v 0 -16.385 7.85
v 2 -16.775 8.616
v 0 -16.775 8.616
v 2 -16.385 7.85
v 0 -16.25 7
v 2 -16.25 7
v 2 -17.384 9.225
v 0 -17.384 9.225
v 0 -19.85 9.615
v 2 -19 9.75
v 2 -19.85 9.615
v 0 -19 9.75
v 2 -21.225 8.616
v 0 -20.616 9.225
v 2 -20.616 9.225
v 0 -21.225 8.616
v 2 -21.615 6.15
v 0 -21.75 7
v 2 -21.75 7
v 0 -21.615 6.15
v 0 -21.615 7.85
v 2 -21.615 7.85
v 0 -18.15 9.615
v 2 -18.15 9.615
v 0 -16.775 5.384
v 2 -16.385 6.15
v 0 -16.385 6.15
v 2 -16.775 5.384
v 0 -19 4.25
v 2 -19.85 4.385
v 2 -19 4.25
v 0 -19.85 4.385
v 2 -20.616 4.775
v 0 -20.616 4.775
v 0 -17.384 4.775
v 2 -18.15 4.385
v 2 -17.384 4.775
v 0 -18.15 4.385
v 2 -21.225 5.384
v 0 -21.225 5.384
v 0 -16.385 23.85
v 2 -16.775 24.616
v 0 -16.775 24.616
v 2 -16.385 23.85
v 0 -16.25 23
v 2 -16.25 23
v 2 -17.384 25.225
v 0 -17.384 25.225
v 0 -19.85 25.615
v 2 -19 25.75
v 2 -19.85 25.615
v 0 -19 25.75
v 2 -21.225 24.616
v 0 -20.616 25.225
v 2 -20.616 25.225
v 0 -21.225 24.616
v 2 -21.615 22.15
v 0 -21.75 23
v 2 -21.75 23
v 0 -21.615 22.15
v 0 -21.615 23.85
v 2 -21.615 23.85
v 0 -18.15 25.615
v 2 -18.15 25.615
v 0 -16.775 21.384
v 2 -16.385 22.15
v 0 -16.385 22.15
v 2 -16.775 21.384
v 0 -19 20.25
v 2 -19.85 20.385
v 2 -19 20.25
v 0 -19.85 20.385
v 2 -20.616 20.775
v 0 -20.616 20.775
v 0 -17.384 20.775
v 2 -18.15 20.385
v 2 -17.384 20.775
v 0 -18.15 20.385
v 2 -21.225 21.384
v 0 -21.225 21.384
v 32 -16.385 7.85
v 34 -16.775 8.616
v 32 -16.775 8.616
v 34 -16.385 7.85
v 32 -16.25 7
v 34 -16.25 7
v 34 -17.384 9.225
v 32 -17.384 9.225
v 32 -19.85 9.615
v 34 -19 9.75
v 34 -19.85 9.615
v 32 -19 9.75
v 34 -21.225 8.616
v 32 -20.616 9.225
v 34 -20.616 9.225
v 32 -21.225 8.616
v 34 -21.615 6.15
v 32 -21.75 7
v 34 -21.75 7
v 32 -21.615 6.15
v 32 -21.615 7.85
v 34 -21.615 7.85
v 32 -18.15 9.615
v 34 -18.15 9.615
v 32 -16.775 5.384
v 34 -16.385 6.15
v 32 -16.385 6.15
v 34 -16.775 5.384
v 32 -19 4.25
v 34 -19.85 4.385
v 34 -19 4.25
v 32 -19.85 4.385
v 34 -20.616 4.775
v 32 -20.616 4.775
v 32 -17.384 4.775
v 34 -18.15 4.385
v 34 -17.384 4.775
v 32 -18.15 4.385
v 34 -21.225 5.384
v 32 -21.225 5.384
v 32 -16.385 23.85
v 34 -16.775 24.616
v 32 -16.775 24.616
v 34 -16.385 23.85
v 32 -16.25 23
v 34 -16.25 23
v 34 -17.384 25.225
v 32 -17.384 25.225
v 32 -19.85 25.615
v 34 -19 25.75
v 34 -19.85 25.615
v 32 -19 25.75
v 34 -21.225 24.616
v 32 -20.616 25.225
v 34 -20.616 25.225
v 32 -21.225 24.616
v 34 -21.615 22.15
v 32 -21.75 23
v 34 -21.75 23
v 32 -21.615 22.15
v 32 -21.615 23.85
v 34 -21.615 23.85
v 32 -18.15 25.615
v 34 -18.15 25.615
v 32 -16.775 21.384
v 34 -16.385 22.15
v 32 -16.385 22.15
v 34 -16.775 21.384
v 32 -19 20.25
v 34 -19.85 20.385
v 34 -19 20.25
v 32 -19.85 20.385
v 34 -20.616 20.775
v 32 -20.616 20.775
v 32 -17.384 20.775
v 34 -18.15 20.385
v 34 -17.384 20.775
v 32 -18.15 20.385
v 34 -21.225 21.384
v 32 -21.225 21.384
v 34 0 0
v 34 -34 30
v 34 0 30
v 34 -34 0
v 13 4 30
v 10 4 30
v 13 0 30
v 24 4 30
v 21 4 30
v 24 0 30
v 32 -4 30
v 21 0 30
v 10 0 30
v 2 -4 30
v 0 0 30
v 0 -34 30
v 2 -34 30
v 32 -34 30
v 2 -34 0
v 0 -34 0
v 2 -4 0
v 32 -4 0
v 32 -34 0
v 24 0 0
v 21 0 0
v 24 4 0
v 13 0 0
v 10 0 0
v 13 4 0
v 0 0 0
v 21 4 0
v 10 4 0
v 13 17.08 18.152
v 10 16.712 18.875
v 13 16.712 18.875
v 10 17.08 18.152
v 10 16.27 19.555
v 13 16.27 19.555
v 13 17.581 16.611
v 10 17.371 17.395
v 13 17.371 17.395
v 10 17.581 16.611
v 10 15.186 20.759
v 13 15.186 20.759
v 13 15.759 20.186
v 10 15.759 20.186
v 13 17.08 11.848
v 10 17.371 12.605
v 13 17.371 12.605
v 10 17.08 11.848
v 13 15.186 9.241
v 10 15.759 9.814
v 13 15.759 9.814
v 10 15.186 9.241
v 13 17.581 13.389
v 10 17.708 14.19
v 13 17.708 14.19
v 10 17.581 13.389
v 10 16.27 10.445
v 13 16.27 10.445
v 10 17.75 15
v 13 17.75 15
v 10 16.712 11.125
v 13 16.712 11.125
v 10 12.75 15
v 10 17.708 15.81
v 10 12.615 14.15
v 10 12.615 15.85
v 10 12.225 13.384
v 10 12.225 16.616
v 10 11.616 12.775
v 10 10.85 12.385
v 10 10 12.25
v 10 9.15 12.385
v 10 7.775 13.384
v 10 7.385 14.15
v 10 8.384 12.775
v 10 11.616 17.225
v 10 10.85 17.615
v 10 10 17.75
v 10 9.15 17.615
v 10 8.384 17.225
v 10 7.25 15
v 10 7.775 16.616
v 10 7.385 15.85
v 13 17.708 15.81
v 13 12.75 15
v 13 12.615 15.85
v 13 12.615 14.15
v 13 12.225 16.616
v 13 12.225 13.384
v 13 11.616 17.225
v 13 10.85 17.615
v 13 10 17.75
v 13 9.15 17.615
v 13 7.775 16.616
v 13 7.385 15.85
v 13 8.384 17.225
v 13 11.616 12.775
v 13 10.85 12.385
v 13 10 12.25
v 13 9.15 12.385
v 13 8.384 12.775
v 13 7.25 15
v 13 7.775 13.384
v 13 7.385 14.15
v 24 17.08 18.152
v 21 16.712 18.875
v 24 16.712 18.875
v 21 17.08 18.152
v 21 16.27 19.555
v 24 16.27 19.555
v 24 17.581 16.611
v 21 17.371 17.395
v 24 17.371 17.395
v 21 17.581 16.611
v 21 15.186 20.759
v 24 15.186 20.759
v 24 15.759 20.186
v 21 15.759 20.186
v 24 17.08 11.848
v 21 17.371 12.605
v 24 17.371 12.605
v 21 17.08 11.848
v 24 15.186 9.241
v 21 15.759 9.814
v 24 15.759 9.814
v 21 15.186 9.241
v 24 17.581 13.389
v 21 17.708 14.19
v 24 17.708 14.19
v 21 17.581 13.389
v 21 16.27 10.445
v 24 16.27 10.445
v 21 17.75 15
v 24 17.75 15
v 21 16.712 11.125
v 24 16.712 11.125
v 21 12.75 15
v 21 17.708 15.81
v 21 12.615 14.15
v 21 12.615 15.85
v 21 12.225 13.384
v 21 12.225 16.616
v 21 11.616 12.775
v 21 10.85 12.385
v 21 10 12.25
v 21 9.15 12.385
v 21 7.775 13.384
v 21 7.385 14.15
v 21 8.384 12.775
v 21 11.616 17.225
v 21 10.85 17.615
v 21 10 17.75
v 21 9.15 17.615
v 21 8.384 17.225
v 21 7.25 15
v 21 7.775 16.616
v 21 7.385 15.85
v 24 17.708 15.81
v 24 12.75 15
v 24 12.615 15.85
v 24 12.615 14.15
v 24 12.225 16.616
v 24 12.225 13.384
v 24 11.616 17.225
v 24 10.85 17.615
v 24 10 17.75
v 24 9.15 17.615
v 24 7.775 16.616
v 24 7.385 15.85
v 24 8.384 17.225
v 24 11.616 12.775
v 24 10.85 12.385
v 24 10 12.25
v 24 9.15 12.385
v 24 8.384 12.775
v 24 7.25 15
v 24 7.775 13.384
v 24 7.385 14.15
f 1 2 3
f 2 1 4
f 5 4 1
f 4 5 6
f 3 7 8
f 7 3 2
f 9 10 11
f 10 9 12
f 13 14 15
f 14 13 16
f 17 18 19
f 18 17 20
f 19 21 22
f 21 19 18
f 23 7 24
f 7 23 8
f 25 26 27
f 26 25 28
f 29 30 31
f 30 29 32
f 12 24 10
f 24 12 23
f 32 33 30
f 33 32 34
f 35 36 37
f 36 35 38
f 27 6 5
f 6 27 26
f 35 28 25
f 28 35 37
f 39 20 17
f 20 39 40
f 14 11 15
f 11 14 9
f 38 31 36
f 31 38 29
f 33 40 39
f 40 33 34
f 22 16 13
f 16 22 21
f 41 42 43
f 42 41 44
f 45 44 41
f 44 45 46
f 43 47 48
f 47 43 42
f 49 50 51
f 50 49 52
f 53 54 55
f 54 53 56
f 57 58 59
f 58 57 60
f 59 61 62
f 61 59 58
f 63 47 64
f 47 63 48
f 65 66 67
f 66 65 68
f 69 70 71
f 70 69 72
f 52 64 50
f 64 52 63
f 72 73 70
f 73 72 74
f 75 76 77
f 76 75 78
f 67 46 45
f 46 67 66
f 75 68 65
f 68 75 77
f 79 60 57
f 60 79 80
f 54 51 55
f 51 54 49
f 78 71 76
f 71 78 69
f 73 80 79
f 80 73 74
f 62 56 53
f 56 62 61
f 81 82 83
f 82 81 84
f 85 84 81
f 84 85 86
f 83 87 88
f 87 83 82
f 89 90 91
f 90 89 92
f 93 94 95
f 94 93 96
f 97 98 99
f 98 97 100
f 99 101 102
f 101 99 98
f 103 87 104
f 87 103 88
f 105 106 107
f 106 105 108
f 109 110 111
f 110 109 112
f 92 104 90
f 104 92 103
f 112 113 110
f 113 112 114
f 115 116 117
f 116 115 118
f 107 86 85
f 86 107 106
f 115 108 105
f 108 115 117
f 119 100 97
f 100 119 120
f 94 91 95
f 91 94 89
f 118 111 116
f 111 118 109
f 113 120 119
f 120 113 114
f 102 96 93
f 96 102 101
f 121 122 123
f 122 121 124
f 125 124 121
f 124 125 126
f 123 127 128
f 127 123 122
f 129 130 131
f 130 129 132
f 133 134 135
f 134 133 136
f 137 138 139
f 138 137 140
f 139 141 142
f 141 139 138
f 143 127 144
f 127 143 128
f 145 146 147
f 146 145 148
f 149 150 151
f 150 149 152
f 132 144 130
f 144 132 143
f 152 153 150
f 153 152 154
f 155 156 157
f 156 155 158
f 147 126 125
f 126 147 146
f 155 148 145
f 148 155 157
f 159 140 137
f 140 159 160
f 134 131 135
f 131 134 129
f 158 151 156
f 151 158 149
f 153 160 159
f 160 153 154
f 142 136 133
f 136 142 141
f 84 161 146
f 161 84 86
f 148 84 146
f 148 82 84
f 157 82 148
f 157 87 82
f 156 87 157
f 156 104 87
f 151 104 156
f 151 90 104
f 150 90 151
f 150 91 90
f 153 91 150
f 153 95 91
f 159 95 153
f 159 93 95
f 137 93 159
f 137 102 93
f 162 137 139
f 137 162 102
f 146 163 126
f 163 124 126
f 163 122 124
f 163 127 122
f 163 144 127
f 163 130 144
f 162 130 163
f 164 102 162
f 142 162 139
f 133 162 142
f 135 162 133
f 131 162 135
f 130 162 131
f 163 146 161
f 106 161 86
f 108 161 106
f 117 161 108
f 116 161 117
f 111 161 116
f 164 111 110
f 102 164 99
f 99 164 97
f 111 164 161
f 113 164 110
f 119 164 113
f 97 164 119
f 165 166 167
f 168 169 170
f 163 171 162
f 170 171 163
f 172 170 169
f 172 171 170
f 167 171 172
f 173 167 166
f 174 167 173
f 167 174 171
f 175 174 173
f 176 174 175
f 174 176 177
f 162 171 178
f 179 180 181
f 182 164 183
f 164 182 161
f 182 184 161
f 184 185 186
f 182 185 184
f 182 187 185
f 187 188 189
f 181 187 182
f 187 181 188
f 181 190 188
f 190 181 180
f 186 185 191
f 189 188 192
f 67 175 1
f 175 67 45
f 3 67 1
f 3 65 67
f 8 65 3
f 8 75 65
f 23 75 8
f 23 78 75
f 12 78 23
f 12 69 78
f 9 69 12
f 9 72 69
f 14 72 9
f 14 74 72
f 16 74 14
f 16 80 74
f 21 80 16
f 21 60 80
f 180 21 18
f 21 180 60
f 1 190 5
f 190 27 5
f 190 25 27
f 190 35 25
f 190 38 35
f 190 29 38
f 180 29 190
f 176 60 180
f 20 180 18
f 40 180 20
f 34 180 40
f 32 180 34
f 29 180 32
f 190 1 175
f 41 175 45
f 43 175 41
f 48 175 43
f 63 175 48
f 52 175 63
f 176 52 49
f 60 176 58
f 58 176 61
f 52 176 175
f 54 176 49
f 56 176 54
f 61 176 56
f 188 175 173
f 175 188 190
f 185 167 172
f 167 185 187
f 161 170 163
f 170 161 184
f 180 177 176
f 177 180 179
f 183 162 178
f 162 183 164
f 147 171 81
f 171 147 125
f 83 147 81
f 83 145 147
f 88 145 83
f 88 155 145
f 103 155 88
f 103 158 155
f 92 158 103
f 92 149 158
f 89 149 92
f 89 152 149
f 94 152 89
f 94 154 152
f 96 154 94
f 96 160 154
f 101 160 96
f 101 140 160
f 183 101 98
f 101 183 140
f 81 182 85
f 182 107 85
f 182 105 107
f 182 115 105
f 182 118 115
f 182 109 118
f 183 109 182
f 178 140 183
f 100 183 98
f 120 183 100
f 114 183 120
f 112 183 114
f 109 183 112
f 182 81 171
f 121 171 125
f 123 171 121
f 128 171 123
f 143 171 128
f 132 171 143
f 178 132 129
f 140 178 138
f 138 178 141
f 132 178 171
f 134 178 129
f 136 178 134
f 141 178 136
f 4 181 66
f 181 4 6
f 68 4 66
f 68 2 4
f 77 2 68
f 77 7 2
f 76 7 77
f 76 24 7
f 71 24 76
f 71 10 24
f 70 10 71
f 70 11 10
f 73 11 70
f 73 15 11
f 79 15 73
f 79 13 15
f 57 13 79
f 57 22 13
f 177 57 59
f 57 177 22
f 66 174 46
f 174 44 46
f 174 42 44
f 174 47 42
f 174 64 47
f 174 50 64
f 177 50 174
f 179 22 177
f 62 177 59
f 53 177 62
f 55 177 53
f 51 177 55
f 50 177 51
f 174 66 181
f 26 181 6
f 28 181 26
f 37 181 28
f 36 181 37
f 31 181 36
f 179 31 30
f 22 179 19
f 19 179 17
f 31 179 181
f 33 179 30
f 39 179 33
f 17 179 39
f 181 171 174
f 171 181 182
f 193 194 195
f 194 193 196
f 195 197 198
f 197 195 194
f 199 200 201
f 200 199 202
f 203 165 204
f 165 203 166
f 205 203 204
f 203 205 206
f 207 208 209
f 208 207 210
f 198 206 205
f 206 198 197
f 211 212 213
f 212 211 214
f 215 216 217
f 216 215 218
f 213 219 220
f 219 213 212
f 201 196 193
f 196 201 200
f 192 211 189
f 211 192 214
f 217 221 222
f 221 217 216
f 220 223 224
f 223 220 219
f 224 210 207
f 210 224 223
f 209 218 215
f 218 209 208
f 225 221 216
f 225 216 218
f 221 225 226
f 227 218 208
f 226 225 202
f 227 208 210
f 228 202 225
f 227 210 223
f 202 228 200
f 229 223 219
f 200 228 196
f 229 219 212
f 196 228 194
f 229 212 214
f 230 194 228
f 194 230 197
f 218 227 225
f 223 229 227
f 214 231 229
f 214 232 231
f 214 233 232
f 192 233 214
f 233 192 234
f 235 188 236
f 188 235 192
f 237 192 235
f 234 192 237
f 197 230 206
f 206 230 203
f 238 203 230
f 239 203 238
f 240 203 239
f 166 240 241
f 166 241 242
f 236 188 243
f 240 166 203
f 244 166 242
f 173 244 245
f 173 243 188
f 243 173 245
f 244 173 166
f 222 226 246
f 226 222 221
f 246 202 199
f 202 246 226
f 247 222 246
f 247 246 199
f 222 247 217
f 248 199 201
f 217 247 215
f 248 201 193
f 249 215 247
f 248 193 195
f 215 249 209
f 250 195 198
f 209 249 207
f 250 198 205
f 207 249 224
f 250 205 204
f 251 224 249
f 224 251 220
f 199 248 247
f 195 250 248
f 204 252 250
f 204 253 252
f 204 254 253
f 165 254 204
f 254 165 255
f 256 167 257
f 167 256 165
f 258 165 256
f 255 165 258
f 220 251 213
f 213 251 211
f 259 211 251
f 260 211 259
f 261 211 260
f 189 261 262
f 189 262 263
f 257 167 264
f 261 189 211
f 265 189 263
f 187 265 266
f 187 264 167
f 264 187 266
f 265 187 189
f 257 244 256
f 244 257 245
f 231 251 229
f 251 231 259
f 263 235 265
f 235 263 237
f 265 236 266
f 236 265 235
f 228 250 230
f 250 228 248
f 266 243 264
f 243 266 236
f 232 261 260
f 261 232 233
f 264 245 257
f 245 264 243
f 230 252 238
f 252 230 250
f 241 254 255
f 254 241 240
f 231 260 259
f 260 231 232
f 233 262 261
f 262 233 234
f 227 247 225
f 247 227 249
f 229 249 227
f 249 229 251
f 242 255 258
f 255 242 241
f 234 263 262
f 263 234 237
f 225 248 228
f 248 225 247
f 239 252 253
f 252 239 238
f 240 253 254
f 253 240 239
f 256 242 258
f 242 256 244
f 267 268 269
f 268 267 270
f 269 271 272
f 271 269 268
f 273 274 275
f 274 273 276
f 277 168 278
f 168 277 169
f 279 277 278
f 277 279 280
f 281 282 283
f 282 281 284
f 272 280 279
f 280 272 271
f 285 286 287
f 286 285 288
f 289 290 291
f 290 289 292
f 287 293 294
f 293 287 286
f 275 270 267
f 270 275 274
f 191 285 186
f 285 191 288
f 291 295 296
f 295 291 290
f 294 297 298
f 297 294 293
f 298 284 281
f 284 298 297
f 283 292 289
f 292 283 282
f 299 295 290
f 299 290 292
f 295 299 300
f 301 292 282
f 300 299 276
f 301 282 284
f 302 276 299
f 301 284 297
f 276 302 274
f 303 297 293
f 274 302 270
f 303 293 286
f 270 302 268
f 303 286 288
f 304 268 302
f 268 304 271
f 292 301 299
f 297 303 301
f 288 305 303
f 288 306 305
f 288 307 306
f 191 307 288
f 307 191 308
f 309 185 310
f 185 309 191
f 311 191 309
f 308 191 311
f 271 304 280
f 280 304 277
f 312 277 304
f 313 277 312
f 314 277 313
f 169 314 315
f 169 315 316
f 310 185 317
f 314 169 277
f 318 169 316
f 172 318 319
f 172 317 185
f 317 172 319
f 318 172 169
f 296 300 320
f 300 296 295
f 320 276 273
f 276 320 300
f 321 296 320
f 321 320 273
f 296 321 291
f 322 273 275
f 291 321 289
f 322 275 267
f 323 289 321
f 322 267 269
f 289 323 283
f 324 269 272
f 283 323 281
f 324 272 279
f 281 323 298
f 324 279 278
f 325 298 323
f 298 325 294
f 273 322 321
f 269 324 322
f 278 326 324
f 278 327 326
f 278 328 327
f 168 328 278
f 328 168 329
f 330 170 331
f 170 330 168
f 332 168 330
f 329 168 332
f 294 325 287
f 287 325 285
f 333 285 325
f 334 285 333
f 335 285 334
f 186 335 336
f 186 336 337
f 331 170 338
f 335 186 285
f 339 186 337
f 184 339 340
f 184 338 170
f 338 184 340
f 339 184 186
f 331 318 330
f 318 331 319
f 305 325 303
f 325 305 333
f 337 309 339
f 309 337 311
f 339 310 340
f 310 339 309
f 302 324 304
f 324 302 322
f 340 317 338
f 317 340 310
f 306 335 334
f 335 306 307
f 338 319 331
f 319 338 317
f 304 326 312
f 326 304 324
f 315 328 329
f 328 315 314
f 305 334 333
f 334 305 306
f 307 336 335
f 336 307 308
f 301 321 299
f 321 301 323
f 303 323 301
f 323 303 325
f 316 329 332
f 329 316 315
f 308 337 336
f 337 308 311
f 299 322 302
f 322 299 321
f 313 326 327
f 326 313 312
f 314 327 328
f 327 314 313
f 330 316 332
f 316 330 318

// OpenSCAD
// file: ../lib/ALU_profile_holder_side.scad
include <../../parameters.scad>



module ALU_profile_holder_side() {
    wall_thickness = ALU_profile_holder_wall_thickness;
    
    //díry na přišroubování k Al profilům
    module screws_holes(diameter) {
        translate([0, 0, 7])
            rotate([90, 0, 90])
                cylinder(d=diameter, h=wall_thickness*2, center=true, $fn=20);
        
        translate([0, 0, strain_gauge_screw_distance+13])
            rotate([90, 0, 90])
                cylinder(d=diameter, h=wall_thickness*2, center=true, $fn=20);
    }
    
    difference() {
        cube([ALU_profile_width+wall_thickness*2, ALU_profile_width+wall_thickness*2, strain_gauge_screw_distance+20]);

        translate([wall_thickness, 0, 0])
        cube([ALU_profile_width, ALU_profile_width, strain_gauge_screw_distance+20]);
        
        translate([wall_thickness*0.5, ALU_profile_width/2, 0]) {
                screws_holes(M5_screw_diameter);
                translate([ALU_profile_width+wall_thickness, 0, 0]) {
                    screws_holes(M5_screw_diameter);
                }
        }
    }
}

ALU_profile_holder_side();
// file: ../../parameters.scad
//Main tube diameter - hole [mm]
main_tube_outer_diameter = 25.4;
main_tube_inner_diameter = 23.05;

//Tube for undercarriage - rendered hole [mm]
tube_for_undercarriage_outer_diameter = 10.6;
tube_for_undercarriage_inner_diameter = 6;
global_clearance = 0.5;


// Nastavení parametrů rotoru

gliding_aggle = 14;         // tenhle úhel by se zřejmě v budoucnu měl počítat z požadované klouzavosti.


rotor_blade_AOA = 1.5;      // nastavení úhlu náběhu rotorového listu
rotor_blade_length = 970;   // délka rotorového listu
rotor_blade_depth = 50;     // hloubka rotorového listu

// nastavení parametrů motoru

engine_angle = -8;
engine_diameter = 55;
engine_offset = 55;

engine_screws_radius = 15;
engine_holes_radius = (24 + 44)/4;
engine_shatf_hole_diameter = 13;

// Parameters of tube couplings
coupling_wall_thickness = main_tube_outer_diameter/5;  //width of coupling walls
thickness_between_tubes = main_tube_outer_diameter/10;    // minimum distance between tubes in couplings

coupling_wall_thickness_undercarriage = tube_for_undercarriage_outer_diameter/3;
thickness_between_tubes_undercarriage = tube_for_undercarriage_outer_diameter/10;

608_bearing_outer_diameter = 22.3;
608_bearing_thickness = 7.1;


// screw length step - minimum difference in length between two types of screws
basic_screw_length = 5;


//Screw diameter and nut for M10 [mm]
M10_screw_diameter=10.4;
M10_head_height = 10;
M10_head_diameter = 16+0.5;
M10_nut_height = 10.5;
M10_nut_diameter = 25.5;
M10_nut_pocket = 22.3;

//Screw diameter for M8 [mm]
M8_screw_diameter = 8.6;
M8_head_height = 8;
M8_head_diameter = 13.5;
M8_nut_height = 7.5;
M8_nut_diameter = 14.4 + 0.5;
M8_nut_pocket = 13 + 0.5;

//Screw diameter and nut for M6 [mm]
M6_screw_diameter=6.5;
M6_head_diameter = 10+0.5;
M6_head_height = 6;
M6_nut_height = 4.9;
M6_nut_diameter = 11.8;
M6_nut_pocket = 10.4;

//Screw diameter and nut for M5 [mm]
M5_screw_diameter=5.5;
M5_head_height = 5;
M5_head_diameter = 13+0.5;
M5_nut_height = 4.5;
M5_nut_diameter = 9.4;
M5_nut_pocket = 8.4;

//Screw diameter and nut for M4 [mm]
M4_screw_diameter=4.5;
M4_screw_head_height = 4;
M4_nut_height = 3.2;
M4_nut_diameter = 8.4;
M4_nut_pocket = 7.5;

//Screw diameter and nut for M3 [mm]
M3_screw_diameter = 3.2;
M3_nut_height = 2.7;
M3_nut_diameter = 6.6;
M3_screw_head_height = 3;

//Screw diameter and nut for M2,5 [mm]
M2_5_screw_diameter = 2.7;
M2_5_nut_height = 2.3;
M2_5_nut_diameter = 6;
M2_5_nut_pocket = 5.5;


//šroub servo
Servo_screw = 1.5;

//The tube for help
Help_main_tube_outer = 25;
Help_main_tube_inner = 23;
Help_tube_for_undercarriage_outer = 10;
Help_tube_for_undercarriage_inner = 5;


//main hull parameters

hull_drop_length = 580;
hull_wall_thickness = 0.8;
hull_y_size = 120;
hull_z_size = 150;
hull_x_size = 580;
hull_corner_radius = 4;
hull_airfoil_thickness= 35;  // thickness of drop generating airfoil in percent of length.
hull_scale_x = 1;
hull_scale_y = 1.5;
hull_scale_z = 1.5;

main_pilon_position = 170+68+30;       // pozice rotorového pilonu měřená od přední části krytu
cover_pilon_position = 180;
height_of_vertical_tube = 275; //278mm je změřená délka trubky.

//délka hlavní dlouhé trubky
length_of_main_tube = 820;
length_of_undercarriage_tube = 300;

ribbon_width = 5; // šířka vyztužovacích lemů.

// šířka otvoru v přední části kapoty pro držák motoru.
width_of_engine_holder = 63;

//Top Cover Division - dělení horního krytu pro tisk
top_cover_division = [0, 50, 150, 280, 410, hull_x_size]; // upraveny seznam tak, aby deleni začinalo od nuly, což umožňí úplně automatické rozdělení.

//Bottom Cover Division - dělení dolního krytu pro tisk
bottom_cover_division = [0,100,232.5,365, 470, hull_x_size];
// zkrácená část pro payload pro testovací tisk
//bottom_cover_division = [0,200,250,365, 470, hull_x_size];




rotor_height = height_of_vertical_tube + main_tube_outer_diameter/2 + 2*global_clearance + thickness_between_tubes + 30; // změřená výška rotoru je 367mm
center_of_gravity_position = [main_pilon_position - tan(gliding_aggle)*rotor_height, 0, 0];



//Cover pilon division - na výšku (v ose Z)
cover_pilon_division = [0,170,height_of_vertical_tube + main_tube_outer_diameter + coupling_wall_thickness];

//pozice šroubů
	//horní kryt
top_screw_position = [0,
                    (top_cover_division[0] + top_cover_division[1])/2,
                    (top_cover_division[2] - top_cover_division[1])/2 + top_cover_division[1],
                    (top_cover_division[3] - top_cover_division[2])/2 + top_cover_division[2],
                    (top_cover_division[4] - top_cover_division[3])/8 + top_cover_division[3],
                    (top_cover_division[5] - top_cover_division[4])/2 + top_cover_division[4] - top_cover_division[1]/3];
	//spodní kryt
bottom_screw_position = [0,
                        (bottom_cover_division[0] + bottom_cover_division[1])*(2/6),
                        bottom_cover_division[1]*(9/10),
                        bottom_cover_division[3] + bottom_cover_division[1]*(1/10),
                        bottom_cover_division[3] + bottom_cover_division[1]*(3/5)];




//šířka zámků
lock_width = 10;

//délka zámků
lock_length = 3;


//accumulator
//základní rozměry akumulátoru
width_of_accumulator = 129.4;//45+1;
depth_of_accumulator = 40.61;
height_of_accumulator = 43.65;
//Zapuštění akumulátoru
sink_of_accumulator = 5; //main_tube_outer_diameter/5 - M3_nut_height*1.5;

//tloušťka hrany spojky
accumulator_holder_width = 18;
accumulator_holder_thickness = 10;

//posunutí akumálátoru na podložce
move_of_accumulator = 75;   // pozice akumulátoru (ovlivňuje těžiště)


////////////////
// Senzory
///////////////////

//opticalFlow
width_optical_flow_senzor = 45.5;
depth_optical_flow_senzor = 6;
height_optical_flow_senzor = 35;
sink_of_optical_flow_senzor = depth_optical_flow_senzor - 5;
M3_optical_flow_senzor_Z = 30.4;
M3_optical_flow_senzor_X = 24;
M3_optical_flow_senzor_Z_alone = 9.1;
M3_optical_flow_senzor_X_alone = 16.7;

//GPS anténa
GPS_outer_length = 48.01;   //Vnější rozměr
GPS_inner_length = 37.48;   //Vnitřní rozměr
GPS_diameter = (GPS_outer_length - GPS_inner_length)/2;    //Průměr otvoru
GPS_middle_length = GPS_diameter + GPS_inner_length;      //Střední rozměr


////podzvozek

radius_undercarriage = 25;
vzdalenost_x = tan(20) * 131;
vzdalenost_y = (131 - radius_undercarriage)/tan(79);
uhel_y = 90 - 20;
uhel_x = 90 - 79;

maximum_printable_size = 150;


////Pitotova trubice
Pitot_tube_diameter = 4.02 + 1;
Distance_hole_from_tube = 11.92;  //vzdálenost otvoru pro připevnění od samotné trubičky


////směrové kormidlo
Rudder_length = 4*main_tube_outer_diameter;
Rudder_height = 2*main_tube_outer_diameter;
Rudder_depth = main_tube_outer_diameter/2;
gap_width = 2*hull_wall_thickness;      //šířka mezery mezi směrovkou a ocasní plochou
ruder_shaft_diameter = 2.6; //otočné uchycení směrovky - průměr 2 mm


/////spojka 666_1004

    width_666_1004 = (main_tube_outer_diameter+2*coupling_wall_thickness - M3_screw_head_height)/basic_screw_length;
//        echo("width_666_1004 is", width_666_1004);

//        echo("ceil_666_1004 is", ceil(width_666_1004));

    coupling_screw_length_666_1004 = (ceil(width_666_1004)) * basic_screw_length;
        echo("coupling_screw_length_666_1004 is", coupling_screw_length_666_1004);

    coupling_width_666_1004 = coupling_screw_length_666_1004 + M3_screw_head_height;
//        echo("coupling_width_666_1004 is", coupling_width_666_1004);

    height_666_1004 = coupling_width_666_1004;
//        echo("height_666_1004 is", height_666_1004);

    depth_666_1004 = main_tube_outer_diameter*2+2*coupling_wall_thickness+thickness_between_tubes;
//        echo("depth_666_1004 is", depth_666_1004);

    depth_666_1004_drillhelper = main_tube_outer_diameter*3;

/////spojka 666_1026



    width_666_1026 = main_tube_outer_diameter + 2*thickness_between_tubes;

    depth_666_1026 = (main_tube_outer_diameter*2)/basic_screw_length;
//        echo("depth_666_1026 is", depth_666_1026);

//        echo("ceil_666_1026 is", ceil(depth_666_1026));

    coupling_screw_length_666_1026 = (ceil(depth_666_1026)) * basic_screw_length;
        echo("coupling_screw_length_666_1026 is", coupling_screw_length_666_1026);


    thickness_of_plate = coupling_screw_length_666_1026 - M4_screw_head_height - 50; //50 mm je konstatní šířka spojky 666_1026
    echo("thickness_of_plate is", thickness_of_plate);

    coupling_depth_666_1026 = coupling_screw_length_666_1026 - M4_screw_head_height - thickness_of_plate;      //zde je odečten M4_screw_head_height pro určení šířky, tak aby šroub přesahoval pro potřebnou matku
//        echo("coupling_depth_666_1026 is", coupling_depth_666_1026);

    height_666_1026 = 2*main_tube_outer_diameter;
//        echo("height_666_1026 is", height_666_1026);

//tloušťka plechu pro zajištění konstatní šířky spojky 50 mm

    width_666_1026_drillhelper = main_tube_outer_diameter*2;

    depth_666_1026_drillhelper = main_tube_outer_diameter + 4*thickness_between_tubes;


////spojka 666_1017

    width_666_1017 = (main_tube_outer_diameter + 4*coupling_wall_thickness - M3_screw_head_height)/basic_screw_length;
//        echo("width_666_1017 is", width_666_1017);

//        echo("ceil_666_1017 is", ceil(width_666_1017));

    coupling_screw_length_666_1017 = (ceil(width_666_1017)) * basic_screw_length;
        echo("coupling_screw_length_666_1017 is", coupling_screw_length_666_1017);

    coupling_width_666_1017 = coupling_screw_length_666_1017 + M3_screw_head_height;
//        echo("coupling_width_666_1017 is", coupling_width_666_1017);

    depth_666_1017 = coupling_width_666_1017;

    height_666_1017= 70; //main_tube_outer_diameter*1.8+main_tube_outer_diameter+wall_thickness;

    width_666_1017_drillhelper = main_tube_outer_diameter+4*thickness_between_tubes;

    depth_666_1017_drillhelper = main_tube_outer_diameter*2;


////spojka 666_1014

    width_666_1014 = tube_for_undercarriage_outer_diameter + 2*coupling_wall_thickness_undercarriage;

    depth_666_1014 = tube_for_undercarriage_outer_diameter + M3_screw_diameter + 2*coupling_wall_thickness_undercarriage + thickness_between_tubes_undercarriage;

    height_666_1014 = width_666_1014;


    width_666_1014_drillhelper = 2*tube_for_undercarriage_outer_diameter + 2*coupling_wall_thickness_undercarriage;



////spojka 666_1015

    width_666_1015 = tube_for_undercarriage_outer_diameter + 2*coupling_wall_thickness_undercarriage;

    depth_666_1015 = tube_for_undercarriage_outer_diameter*2 + 2*coupling_wall_thickness_undercarriage + thickness_between_tubes_undercarriage;

    height_666_1015 = width_666_1015;


    width_666_1015_drillhelper = 2*tube_for_undercarriage_outer_diameter + 2*coupling_wall_thickness_undercarriage;

////spojka 666_1016

    width_666_1016 = tube_for_undercarriage_outer_diameter + 2*coupling_wall_thickness_undercarriage;

    depth_666_1016 = tube_for_undercarriage_outer_diameter + M6_screw_diameter + 2*coupling_wall_thickness_undercarriage + thickness_between_tubes_undercarriage;

    height_666_1016 = width_666_1016;


    width_666_1016_drillhelper = 2*tube_for_undercarriage_outer_diameter + 2*coupling_wall_thickness_undercarriage;




//umístění podvozkových trubek

second_undercarriage_hole =height_666_1026 + height_666_1004/2 + 170 + 160;


//Base Divison - dělení podložky
base_division = [0, 159, main_pilon_position + coupling_width_666_1017/2 + global_clearance/2, second_undercarriage_hole + coupling_width_666_1004/2 + global_clearance/2, hull_x_size];

// šrouby pro připevnění podložky k hlavní trubce
base_mounting_screw_length = 50;


// kulove lozisko

bearing_efsm_08_h = 33+1;
bearing_efsm_08_m = 22;
bearing_efsm_08_db = 18;
bearing_efsm_08_ag = 10.5;
bearing_efsm_08_n = M4_screw_diameter;
bearing_efsm_08_a1 = 5.5;
bearing_efsm_08_d = 8.25;
bearing_efsm_08_B = 8; // ball height

bearing_efsm_10_h = 38+1;
bearing_efsm_10_m = 26;
bearing_efsm_10_db = 21.9;
bearing_efsm_10_ag = 12+0.2;
bearing_efsm_10_n = M5_screw_diameter;
bearing_efsm_10_a1 = 6.5;
bearing_efsm_10_d = 10.25;


bearing_efsm_12_width = 40+1;
bearing_efsm_12_h = bearing_efsm_12_width;
bearing_efsm_12_boltd = 28/2; // polovina vzdalenosti mezi srouby
bearing_efsm_12_m = bearing_efsm_12_boltd*2;
bearing_efsm_12_db = 25;
bearing_efsm_12_ag = 13;
bearing_efsm_12_a1 = 7;
bearing_efsm_12_n = M5_screw_diameter;
bearing_efsm_12_d = 12.15;
bearing_efsm_12_B = 10; // ball height
bearing_efsm_space = 1;

bearing_efsm_17_width = 54+1;
bearing_efsm_17_h = bearing_efsm_17_width;
bearing_efsm_17_boltd = 38/2; // polovina vzdalenosti mezi srouby
bearing_efsm_17_m = bearing_efsm_17_boltd*2;
bearing_efsm_17_db = 35;
bearing_efsm_17_ag = 18;
bearing_efsm_17_n = M6_screw_diameter;
bearing_efsm_17_a1 = 10;
bearing_efsm_17_B = 17; // ball height

//limcove lozisko
bearing_EFOM_10_L=26; //celkova sirka zakladny
bearing_EFOM_10_d1=10.3;//diametr otvoru real=10 mm
bearing_EFOM_10_dB=22;//diametr vystupku pro ulozeni lozika
bearing_EFOM_10_H=52;//celková delka zakladny
bearing_EFOM_10_J=36;// hole pitch
bearing_EFOM_10_A1=6.5;//vyska pouzdra
bearing_EFOM_10_Ag=12;//celkova vyska
bearing_EFOM_10_N1=5;//sirka otvoru pro sroub
bearing_EFOM_10_N2=8;//delka otvoru pro sroub
bearing_EFOM_10_m=36;//roztec der pro sroub
bearing_EFOM_10_h=9;//vyska lozika




// 20 KG servo parameters


servo_20kg_axis_offset = 9.375; // jak je osa mimo stredu
servo_20kg_body_x = 42;
servo_20kg_body_y = 21;
servo_20kg_body_z = 40;
servo_20kg_thread_x = 49/2;
servo_20kg_thread_y = 10/2;
servo_20kg_body_below = 10; // jak hluboko je tělo serva pod drzaky na srouby
servo_20kg_below = 25.8; // jak hluboko je páka serva pod drzaky na srouby

servo_20kg_bolt_d = 2.5+0.3;
servo_20kg_nut_d = 5+0.3;



//  888_2***
//    G2
//


g2_0_part_space = 2; // mezera mezi zadni a predni casti

g2_5_height = 608_bearing_outer_diameter*1.5;
g2_5_width = 70+5.5+11;
g2_5_threads = 2; // kolik ma byt sroubu skrz nosnou tyc

g2_5_m3_length = base_mounting_screw_length; // sroub, ktery se pouziva na sesroubovani s nosnou tyci
g2_5_servo_shift = 30;
g2_5_servo_wall = 5;

g2_5_m8_length = 60; // sroub, ktery se pouziva jako osa pro podlozku
g2_5_front_l = main_tube_outer_diameter + 608_bearing_outer_diameter*2;// jak moc ma byt magnet v predu

g2_5_zapusteni_serva = 30;
g2_5_length = g2_5_zapusteni_serva + 2*main_tube_outer_diameter + 30;
g2_5_length_offset = -10;

g2_5_bearing_space = 2; // mezera pro podlozku mezi loziskem a stenou..


g2_0_vertical_bolts = 2;
g2_0_space_btw_wheel_holder = 25.8;

g2_6_plate_thickness = 8;
g2_6_servo_distance = 54; // jak je daleko servo pred tyci kola
g2_6_servo_shift = 0; // jak je osa serva mimo stredu
g2_6_servo_bolt_l = 8; // delka sroubu od konce serva po zacatek matky
g2_6_min_wall_around = 8; // minimalni material okolo serva




// pro dily ze skupiny 3 (888_30**)
g3_0_cone1 = 70;
g3_0_cone2 = 50;
g3_0_cone_height = 25;
g3_0_cone_top_height = 11;
g3_0_height = g3_0_cone_height + 40;
g3_0_bearing_bolt_len = 50;
g3_0_srcew_dist = 55;


// Nastavní volností skupiny dílů 888_30**
// Nastavení rozsahů je v deg
g3_0_pitch_limit = [-20:3:20];
g3_0_roll_limit = [-15:3:15];
g3_0_yaw_limit = [-10:3:10];


//pro zakladnu na strechu auta
g3_1_yaw_width = 75;
g3_1_service_holl_height = 8.4 + 2;
g3_1_service_holl_width = 16 + 1.5;

//pro druhy dil
g3_7_length = maximum_printable_size;
g3_7_width = bearing_efsm_17_width + 2*1+ 2*3;
g3_7_height = M8_screw_diameter*3;

g3_8_magnet_wall_thickness = 7;  // tloustka steny u magnetu
g3_8_bearing_wall_thickness = bearing_efsm_12_ag-bearing_efsm_12_a1;
g3_8_magnet_diameter = 63;
g3_8_cylinder_d = 55; // prumer valce
g3_8_cylinder_h = 30 + g3_8_magnet_wall_thickness;
g3_8_m5_lenght = 40; // delka sroubu pro pridelani kuloveho loziska
g3_8_pocket_wall = g3_8_cylinder_h-(g3_8_m5_lenght-bearing_efsm_12_a1-M5_nut_height-5);

// podlozka na strechu auta
g3_9_height = 145;



servo_20kg_width = 21;   //šřka otvoru pro servo
servo_20kg_height = 42;  //výška otvoru pro servo

//strain gauge
strain_gauge_width = 12.7;
strain_gauge_length = 75.1;
strain_gauge_screw_distance = 10;

//ALU profile
ALU_profile_width = 30;
ALU_profile_holder_wall_thickness = 2;

//ložisko
bearing_outer_diameter = 22;
bearing_inner_diameter = 8;
bearing_height = 7;
// main file
include <../../parameters.scad>
use <../lib/ALU_profile_holder_side.scad>

module 888_5005() {
    joint_width = 8;
    wall_thickness = ALU_profile_holder_wall_thickness;
    
    translate([0, -ALU_profile_width-ALU_profile_holder_wall_thickness*2, 0])
        ALU_profile_holder_side();
    
    module holder() {
        difference() {
            hull() {
                cube([3, 4, ALU_profile_width]);
                
                translate([1.5, 10, ALU_profile_width/2])
                    rotate([0, 90, 0])
                        cylinder(d=M5_screw_diameter+10, h=3, $fn=60, center=true);
            }
            
            translate([1.5, 10, ALU_profile_width/2])
                rotate([0, 90, 0])
                    cylinder(d=M5_screw_diameter, h=4, $fn=20, center=true);
        }
    }
    translate([(ALU_profile_width+wall_thickness*2)/2-3-joint_width/2, 0, 0])
        holder();
    translate([(ALU_profile_width+wall_thickness*2)/2+joint_width/2, 0, 0])
        holder();
}

888_5005();
